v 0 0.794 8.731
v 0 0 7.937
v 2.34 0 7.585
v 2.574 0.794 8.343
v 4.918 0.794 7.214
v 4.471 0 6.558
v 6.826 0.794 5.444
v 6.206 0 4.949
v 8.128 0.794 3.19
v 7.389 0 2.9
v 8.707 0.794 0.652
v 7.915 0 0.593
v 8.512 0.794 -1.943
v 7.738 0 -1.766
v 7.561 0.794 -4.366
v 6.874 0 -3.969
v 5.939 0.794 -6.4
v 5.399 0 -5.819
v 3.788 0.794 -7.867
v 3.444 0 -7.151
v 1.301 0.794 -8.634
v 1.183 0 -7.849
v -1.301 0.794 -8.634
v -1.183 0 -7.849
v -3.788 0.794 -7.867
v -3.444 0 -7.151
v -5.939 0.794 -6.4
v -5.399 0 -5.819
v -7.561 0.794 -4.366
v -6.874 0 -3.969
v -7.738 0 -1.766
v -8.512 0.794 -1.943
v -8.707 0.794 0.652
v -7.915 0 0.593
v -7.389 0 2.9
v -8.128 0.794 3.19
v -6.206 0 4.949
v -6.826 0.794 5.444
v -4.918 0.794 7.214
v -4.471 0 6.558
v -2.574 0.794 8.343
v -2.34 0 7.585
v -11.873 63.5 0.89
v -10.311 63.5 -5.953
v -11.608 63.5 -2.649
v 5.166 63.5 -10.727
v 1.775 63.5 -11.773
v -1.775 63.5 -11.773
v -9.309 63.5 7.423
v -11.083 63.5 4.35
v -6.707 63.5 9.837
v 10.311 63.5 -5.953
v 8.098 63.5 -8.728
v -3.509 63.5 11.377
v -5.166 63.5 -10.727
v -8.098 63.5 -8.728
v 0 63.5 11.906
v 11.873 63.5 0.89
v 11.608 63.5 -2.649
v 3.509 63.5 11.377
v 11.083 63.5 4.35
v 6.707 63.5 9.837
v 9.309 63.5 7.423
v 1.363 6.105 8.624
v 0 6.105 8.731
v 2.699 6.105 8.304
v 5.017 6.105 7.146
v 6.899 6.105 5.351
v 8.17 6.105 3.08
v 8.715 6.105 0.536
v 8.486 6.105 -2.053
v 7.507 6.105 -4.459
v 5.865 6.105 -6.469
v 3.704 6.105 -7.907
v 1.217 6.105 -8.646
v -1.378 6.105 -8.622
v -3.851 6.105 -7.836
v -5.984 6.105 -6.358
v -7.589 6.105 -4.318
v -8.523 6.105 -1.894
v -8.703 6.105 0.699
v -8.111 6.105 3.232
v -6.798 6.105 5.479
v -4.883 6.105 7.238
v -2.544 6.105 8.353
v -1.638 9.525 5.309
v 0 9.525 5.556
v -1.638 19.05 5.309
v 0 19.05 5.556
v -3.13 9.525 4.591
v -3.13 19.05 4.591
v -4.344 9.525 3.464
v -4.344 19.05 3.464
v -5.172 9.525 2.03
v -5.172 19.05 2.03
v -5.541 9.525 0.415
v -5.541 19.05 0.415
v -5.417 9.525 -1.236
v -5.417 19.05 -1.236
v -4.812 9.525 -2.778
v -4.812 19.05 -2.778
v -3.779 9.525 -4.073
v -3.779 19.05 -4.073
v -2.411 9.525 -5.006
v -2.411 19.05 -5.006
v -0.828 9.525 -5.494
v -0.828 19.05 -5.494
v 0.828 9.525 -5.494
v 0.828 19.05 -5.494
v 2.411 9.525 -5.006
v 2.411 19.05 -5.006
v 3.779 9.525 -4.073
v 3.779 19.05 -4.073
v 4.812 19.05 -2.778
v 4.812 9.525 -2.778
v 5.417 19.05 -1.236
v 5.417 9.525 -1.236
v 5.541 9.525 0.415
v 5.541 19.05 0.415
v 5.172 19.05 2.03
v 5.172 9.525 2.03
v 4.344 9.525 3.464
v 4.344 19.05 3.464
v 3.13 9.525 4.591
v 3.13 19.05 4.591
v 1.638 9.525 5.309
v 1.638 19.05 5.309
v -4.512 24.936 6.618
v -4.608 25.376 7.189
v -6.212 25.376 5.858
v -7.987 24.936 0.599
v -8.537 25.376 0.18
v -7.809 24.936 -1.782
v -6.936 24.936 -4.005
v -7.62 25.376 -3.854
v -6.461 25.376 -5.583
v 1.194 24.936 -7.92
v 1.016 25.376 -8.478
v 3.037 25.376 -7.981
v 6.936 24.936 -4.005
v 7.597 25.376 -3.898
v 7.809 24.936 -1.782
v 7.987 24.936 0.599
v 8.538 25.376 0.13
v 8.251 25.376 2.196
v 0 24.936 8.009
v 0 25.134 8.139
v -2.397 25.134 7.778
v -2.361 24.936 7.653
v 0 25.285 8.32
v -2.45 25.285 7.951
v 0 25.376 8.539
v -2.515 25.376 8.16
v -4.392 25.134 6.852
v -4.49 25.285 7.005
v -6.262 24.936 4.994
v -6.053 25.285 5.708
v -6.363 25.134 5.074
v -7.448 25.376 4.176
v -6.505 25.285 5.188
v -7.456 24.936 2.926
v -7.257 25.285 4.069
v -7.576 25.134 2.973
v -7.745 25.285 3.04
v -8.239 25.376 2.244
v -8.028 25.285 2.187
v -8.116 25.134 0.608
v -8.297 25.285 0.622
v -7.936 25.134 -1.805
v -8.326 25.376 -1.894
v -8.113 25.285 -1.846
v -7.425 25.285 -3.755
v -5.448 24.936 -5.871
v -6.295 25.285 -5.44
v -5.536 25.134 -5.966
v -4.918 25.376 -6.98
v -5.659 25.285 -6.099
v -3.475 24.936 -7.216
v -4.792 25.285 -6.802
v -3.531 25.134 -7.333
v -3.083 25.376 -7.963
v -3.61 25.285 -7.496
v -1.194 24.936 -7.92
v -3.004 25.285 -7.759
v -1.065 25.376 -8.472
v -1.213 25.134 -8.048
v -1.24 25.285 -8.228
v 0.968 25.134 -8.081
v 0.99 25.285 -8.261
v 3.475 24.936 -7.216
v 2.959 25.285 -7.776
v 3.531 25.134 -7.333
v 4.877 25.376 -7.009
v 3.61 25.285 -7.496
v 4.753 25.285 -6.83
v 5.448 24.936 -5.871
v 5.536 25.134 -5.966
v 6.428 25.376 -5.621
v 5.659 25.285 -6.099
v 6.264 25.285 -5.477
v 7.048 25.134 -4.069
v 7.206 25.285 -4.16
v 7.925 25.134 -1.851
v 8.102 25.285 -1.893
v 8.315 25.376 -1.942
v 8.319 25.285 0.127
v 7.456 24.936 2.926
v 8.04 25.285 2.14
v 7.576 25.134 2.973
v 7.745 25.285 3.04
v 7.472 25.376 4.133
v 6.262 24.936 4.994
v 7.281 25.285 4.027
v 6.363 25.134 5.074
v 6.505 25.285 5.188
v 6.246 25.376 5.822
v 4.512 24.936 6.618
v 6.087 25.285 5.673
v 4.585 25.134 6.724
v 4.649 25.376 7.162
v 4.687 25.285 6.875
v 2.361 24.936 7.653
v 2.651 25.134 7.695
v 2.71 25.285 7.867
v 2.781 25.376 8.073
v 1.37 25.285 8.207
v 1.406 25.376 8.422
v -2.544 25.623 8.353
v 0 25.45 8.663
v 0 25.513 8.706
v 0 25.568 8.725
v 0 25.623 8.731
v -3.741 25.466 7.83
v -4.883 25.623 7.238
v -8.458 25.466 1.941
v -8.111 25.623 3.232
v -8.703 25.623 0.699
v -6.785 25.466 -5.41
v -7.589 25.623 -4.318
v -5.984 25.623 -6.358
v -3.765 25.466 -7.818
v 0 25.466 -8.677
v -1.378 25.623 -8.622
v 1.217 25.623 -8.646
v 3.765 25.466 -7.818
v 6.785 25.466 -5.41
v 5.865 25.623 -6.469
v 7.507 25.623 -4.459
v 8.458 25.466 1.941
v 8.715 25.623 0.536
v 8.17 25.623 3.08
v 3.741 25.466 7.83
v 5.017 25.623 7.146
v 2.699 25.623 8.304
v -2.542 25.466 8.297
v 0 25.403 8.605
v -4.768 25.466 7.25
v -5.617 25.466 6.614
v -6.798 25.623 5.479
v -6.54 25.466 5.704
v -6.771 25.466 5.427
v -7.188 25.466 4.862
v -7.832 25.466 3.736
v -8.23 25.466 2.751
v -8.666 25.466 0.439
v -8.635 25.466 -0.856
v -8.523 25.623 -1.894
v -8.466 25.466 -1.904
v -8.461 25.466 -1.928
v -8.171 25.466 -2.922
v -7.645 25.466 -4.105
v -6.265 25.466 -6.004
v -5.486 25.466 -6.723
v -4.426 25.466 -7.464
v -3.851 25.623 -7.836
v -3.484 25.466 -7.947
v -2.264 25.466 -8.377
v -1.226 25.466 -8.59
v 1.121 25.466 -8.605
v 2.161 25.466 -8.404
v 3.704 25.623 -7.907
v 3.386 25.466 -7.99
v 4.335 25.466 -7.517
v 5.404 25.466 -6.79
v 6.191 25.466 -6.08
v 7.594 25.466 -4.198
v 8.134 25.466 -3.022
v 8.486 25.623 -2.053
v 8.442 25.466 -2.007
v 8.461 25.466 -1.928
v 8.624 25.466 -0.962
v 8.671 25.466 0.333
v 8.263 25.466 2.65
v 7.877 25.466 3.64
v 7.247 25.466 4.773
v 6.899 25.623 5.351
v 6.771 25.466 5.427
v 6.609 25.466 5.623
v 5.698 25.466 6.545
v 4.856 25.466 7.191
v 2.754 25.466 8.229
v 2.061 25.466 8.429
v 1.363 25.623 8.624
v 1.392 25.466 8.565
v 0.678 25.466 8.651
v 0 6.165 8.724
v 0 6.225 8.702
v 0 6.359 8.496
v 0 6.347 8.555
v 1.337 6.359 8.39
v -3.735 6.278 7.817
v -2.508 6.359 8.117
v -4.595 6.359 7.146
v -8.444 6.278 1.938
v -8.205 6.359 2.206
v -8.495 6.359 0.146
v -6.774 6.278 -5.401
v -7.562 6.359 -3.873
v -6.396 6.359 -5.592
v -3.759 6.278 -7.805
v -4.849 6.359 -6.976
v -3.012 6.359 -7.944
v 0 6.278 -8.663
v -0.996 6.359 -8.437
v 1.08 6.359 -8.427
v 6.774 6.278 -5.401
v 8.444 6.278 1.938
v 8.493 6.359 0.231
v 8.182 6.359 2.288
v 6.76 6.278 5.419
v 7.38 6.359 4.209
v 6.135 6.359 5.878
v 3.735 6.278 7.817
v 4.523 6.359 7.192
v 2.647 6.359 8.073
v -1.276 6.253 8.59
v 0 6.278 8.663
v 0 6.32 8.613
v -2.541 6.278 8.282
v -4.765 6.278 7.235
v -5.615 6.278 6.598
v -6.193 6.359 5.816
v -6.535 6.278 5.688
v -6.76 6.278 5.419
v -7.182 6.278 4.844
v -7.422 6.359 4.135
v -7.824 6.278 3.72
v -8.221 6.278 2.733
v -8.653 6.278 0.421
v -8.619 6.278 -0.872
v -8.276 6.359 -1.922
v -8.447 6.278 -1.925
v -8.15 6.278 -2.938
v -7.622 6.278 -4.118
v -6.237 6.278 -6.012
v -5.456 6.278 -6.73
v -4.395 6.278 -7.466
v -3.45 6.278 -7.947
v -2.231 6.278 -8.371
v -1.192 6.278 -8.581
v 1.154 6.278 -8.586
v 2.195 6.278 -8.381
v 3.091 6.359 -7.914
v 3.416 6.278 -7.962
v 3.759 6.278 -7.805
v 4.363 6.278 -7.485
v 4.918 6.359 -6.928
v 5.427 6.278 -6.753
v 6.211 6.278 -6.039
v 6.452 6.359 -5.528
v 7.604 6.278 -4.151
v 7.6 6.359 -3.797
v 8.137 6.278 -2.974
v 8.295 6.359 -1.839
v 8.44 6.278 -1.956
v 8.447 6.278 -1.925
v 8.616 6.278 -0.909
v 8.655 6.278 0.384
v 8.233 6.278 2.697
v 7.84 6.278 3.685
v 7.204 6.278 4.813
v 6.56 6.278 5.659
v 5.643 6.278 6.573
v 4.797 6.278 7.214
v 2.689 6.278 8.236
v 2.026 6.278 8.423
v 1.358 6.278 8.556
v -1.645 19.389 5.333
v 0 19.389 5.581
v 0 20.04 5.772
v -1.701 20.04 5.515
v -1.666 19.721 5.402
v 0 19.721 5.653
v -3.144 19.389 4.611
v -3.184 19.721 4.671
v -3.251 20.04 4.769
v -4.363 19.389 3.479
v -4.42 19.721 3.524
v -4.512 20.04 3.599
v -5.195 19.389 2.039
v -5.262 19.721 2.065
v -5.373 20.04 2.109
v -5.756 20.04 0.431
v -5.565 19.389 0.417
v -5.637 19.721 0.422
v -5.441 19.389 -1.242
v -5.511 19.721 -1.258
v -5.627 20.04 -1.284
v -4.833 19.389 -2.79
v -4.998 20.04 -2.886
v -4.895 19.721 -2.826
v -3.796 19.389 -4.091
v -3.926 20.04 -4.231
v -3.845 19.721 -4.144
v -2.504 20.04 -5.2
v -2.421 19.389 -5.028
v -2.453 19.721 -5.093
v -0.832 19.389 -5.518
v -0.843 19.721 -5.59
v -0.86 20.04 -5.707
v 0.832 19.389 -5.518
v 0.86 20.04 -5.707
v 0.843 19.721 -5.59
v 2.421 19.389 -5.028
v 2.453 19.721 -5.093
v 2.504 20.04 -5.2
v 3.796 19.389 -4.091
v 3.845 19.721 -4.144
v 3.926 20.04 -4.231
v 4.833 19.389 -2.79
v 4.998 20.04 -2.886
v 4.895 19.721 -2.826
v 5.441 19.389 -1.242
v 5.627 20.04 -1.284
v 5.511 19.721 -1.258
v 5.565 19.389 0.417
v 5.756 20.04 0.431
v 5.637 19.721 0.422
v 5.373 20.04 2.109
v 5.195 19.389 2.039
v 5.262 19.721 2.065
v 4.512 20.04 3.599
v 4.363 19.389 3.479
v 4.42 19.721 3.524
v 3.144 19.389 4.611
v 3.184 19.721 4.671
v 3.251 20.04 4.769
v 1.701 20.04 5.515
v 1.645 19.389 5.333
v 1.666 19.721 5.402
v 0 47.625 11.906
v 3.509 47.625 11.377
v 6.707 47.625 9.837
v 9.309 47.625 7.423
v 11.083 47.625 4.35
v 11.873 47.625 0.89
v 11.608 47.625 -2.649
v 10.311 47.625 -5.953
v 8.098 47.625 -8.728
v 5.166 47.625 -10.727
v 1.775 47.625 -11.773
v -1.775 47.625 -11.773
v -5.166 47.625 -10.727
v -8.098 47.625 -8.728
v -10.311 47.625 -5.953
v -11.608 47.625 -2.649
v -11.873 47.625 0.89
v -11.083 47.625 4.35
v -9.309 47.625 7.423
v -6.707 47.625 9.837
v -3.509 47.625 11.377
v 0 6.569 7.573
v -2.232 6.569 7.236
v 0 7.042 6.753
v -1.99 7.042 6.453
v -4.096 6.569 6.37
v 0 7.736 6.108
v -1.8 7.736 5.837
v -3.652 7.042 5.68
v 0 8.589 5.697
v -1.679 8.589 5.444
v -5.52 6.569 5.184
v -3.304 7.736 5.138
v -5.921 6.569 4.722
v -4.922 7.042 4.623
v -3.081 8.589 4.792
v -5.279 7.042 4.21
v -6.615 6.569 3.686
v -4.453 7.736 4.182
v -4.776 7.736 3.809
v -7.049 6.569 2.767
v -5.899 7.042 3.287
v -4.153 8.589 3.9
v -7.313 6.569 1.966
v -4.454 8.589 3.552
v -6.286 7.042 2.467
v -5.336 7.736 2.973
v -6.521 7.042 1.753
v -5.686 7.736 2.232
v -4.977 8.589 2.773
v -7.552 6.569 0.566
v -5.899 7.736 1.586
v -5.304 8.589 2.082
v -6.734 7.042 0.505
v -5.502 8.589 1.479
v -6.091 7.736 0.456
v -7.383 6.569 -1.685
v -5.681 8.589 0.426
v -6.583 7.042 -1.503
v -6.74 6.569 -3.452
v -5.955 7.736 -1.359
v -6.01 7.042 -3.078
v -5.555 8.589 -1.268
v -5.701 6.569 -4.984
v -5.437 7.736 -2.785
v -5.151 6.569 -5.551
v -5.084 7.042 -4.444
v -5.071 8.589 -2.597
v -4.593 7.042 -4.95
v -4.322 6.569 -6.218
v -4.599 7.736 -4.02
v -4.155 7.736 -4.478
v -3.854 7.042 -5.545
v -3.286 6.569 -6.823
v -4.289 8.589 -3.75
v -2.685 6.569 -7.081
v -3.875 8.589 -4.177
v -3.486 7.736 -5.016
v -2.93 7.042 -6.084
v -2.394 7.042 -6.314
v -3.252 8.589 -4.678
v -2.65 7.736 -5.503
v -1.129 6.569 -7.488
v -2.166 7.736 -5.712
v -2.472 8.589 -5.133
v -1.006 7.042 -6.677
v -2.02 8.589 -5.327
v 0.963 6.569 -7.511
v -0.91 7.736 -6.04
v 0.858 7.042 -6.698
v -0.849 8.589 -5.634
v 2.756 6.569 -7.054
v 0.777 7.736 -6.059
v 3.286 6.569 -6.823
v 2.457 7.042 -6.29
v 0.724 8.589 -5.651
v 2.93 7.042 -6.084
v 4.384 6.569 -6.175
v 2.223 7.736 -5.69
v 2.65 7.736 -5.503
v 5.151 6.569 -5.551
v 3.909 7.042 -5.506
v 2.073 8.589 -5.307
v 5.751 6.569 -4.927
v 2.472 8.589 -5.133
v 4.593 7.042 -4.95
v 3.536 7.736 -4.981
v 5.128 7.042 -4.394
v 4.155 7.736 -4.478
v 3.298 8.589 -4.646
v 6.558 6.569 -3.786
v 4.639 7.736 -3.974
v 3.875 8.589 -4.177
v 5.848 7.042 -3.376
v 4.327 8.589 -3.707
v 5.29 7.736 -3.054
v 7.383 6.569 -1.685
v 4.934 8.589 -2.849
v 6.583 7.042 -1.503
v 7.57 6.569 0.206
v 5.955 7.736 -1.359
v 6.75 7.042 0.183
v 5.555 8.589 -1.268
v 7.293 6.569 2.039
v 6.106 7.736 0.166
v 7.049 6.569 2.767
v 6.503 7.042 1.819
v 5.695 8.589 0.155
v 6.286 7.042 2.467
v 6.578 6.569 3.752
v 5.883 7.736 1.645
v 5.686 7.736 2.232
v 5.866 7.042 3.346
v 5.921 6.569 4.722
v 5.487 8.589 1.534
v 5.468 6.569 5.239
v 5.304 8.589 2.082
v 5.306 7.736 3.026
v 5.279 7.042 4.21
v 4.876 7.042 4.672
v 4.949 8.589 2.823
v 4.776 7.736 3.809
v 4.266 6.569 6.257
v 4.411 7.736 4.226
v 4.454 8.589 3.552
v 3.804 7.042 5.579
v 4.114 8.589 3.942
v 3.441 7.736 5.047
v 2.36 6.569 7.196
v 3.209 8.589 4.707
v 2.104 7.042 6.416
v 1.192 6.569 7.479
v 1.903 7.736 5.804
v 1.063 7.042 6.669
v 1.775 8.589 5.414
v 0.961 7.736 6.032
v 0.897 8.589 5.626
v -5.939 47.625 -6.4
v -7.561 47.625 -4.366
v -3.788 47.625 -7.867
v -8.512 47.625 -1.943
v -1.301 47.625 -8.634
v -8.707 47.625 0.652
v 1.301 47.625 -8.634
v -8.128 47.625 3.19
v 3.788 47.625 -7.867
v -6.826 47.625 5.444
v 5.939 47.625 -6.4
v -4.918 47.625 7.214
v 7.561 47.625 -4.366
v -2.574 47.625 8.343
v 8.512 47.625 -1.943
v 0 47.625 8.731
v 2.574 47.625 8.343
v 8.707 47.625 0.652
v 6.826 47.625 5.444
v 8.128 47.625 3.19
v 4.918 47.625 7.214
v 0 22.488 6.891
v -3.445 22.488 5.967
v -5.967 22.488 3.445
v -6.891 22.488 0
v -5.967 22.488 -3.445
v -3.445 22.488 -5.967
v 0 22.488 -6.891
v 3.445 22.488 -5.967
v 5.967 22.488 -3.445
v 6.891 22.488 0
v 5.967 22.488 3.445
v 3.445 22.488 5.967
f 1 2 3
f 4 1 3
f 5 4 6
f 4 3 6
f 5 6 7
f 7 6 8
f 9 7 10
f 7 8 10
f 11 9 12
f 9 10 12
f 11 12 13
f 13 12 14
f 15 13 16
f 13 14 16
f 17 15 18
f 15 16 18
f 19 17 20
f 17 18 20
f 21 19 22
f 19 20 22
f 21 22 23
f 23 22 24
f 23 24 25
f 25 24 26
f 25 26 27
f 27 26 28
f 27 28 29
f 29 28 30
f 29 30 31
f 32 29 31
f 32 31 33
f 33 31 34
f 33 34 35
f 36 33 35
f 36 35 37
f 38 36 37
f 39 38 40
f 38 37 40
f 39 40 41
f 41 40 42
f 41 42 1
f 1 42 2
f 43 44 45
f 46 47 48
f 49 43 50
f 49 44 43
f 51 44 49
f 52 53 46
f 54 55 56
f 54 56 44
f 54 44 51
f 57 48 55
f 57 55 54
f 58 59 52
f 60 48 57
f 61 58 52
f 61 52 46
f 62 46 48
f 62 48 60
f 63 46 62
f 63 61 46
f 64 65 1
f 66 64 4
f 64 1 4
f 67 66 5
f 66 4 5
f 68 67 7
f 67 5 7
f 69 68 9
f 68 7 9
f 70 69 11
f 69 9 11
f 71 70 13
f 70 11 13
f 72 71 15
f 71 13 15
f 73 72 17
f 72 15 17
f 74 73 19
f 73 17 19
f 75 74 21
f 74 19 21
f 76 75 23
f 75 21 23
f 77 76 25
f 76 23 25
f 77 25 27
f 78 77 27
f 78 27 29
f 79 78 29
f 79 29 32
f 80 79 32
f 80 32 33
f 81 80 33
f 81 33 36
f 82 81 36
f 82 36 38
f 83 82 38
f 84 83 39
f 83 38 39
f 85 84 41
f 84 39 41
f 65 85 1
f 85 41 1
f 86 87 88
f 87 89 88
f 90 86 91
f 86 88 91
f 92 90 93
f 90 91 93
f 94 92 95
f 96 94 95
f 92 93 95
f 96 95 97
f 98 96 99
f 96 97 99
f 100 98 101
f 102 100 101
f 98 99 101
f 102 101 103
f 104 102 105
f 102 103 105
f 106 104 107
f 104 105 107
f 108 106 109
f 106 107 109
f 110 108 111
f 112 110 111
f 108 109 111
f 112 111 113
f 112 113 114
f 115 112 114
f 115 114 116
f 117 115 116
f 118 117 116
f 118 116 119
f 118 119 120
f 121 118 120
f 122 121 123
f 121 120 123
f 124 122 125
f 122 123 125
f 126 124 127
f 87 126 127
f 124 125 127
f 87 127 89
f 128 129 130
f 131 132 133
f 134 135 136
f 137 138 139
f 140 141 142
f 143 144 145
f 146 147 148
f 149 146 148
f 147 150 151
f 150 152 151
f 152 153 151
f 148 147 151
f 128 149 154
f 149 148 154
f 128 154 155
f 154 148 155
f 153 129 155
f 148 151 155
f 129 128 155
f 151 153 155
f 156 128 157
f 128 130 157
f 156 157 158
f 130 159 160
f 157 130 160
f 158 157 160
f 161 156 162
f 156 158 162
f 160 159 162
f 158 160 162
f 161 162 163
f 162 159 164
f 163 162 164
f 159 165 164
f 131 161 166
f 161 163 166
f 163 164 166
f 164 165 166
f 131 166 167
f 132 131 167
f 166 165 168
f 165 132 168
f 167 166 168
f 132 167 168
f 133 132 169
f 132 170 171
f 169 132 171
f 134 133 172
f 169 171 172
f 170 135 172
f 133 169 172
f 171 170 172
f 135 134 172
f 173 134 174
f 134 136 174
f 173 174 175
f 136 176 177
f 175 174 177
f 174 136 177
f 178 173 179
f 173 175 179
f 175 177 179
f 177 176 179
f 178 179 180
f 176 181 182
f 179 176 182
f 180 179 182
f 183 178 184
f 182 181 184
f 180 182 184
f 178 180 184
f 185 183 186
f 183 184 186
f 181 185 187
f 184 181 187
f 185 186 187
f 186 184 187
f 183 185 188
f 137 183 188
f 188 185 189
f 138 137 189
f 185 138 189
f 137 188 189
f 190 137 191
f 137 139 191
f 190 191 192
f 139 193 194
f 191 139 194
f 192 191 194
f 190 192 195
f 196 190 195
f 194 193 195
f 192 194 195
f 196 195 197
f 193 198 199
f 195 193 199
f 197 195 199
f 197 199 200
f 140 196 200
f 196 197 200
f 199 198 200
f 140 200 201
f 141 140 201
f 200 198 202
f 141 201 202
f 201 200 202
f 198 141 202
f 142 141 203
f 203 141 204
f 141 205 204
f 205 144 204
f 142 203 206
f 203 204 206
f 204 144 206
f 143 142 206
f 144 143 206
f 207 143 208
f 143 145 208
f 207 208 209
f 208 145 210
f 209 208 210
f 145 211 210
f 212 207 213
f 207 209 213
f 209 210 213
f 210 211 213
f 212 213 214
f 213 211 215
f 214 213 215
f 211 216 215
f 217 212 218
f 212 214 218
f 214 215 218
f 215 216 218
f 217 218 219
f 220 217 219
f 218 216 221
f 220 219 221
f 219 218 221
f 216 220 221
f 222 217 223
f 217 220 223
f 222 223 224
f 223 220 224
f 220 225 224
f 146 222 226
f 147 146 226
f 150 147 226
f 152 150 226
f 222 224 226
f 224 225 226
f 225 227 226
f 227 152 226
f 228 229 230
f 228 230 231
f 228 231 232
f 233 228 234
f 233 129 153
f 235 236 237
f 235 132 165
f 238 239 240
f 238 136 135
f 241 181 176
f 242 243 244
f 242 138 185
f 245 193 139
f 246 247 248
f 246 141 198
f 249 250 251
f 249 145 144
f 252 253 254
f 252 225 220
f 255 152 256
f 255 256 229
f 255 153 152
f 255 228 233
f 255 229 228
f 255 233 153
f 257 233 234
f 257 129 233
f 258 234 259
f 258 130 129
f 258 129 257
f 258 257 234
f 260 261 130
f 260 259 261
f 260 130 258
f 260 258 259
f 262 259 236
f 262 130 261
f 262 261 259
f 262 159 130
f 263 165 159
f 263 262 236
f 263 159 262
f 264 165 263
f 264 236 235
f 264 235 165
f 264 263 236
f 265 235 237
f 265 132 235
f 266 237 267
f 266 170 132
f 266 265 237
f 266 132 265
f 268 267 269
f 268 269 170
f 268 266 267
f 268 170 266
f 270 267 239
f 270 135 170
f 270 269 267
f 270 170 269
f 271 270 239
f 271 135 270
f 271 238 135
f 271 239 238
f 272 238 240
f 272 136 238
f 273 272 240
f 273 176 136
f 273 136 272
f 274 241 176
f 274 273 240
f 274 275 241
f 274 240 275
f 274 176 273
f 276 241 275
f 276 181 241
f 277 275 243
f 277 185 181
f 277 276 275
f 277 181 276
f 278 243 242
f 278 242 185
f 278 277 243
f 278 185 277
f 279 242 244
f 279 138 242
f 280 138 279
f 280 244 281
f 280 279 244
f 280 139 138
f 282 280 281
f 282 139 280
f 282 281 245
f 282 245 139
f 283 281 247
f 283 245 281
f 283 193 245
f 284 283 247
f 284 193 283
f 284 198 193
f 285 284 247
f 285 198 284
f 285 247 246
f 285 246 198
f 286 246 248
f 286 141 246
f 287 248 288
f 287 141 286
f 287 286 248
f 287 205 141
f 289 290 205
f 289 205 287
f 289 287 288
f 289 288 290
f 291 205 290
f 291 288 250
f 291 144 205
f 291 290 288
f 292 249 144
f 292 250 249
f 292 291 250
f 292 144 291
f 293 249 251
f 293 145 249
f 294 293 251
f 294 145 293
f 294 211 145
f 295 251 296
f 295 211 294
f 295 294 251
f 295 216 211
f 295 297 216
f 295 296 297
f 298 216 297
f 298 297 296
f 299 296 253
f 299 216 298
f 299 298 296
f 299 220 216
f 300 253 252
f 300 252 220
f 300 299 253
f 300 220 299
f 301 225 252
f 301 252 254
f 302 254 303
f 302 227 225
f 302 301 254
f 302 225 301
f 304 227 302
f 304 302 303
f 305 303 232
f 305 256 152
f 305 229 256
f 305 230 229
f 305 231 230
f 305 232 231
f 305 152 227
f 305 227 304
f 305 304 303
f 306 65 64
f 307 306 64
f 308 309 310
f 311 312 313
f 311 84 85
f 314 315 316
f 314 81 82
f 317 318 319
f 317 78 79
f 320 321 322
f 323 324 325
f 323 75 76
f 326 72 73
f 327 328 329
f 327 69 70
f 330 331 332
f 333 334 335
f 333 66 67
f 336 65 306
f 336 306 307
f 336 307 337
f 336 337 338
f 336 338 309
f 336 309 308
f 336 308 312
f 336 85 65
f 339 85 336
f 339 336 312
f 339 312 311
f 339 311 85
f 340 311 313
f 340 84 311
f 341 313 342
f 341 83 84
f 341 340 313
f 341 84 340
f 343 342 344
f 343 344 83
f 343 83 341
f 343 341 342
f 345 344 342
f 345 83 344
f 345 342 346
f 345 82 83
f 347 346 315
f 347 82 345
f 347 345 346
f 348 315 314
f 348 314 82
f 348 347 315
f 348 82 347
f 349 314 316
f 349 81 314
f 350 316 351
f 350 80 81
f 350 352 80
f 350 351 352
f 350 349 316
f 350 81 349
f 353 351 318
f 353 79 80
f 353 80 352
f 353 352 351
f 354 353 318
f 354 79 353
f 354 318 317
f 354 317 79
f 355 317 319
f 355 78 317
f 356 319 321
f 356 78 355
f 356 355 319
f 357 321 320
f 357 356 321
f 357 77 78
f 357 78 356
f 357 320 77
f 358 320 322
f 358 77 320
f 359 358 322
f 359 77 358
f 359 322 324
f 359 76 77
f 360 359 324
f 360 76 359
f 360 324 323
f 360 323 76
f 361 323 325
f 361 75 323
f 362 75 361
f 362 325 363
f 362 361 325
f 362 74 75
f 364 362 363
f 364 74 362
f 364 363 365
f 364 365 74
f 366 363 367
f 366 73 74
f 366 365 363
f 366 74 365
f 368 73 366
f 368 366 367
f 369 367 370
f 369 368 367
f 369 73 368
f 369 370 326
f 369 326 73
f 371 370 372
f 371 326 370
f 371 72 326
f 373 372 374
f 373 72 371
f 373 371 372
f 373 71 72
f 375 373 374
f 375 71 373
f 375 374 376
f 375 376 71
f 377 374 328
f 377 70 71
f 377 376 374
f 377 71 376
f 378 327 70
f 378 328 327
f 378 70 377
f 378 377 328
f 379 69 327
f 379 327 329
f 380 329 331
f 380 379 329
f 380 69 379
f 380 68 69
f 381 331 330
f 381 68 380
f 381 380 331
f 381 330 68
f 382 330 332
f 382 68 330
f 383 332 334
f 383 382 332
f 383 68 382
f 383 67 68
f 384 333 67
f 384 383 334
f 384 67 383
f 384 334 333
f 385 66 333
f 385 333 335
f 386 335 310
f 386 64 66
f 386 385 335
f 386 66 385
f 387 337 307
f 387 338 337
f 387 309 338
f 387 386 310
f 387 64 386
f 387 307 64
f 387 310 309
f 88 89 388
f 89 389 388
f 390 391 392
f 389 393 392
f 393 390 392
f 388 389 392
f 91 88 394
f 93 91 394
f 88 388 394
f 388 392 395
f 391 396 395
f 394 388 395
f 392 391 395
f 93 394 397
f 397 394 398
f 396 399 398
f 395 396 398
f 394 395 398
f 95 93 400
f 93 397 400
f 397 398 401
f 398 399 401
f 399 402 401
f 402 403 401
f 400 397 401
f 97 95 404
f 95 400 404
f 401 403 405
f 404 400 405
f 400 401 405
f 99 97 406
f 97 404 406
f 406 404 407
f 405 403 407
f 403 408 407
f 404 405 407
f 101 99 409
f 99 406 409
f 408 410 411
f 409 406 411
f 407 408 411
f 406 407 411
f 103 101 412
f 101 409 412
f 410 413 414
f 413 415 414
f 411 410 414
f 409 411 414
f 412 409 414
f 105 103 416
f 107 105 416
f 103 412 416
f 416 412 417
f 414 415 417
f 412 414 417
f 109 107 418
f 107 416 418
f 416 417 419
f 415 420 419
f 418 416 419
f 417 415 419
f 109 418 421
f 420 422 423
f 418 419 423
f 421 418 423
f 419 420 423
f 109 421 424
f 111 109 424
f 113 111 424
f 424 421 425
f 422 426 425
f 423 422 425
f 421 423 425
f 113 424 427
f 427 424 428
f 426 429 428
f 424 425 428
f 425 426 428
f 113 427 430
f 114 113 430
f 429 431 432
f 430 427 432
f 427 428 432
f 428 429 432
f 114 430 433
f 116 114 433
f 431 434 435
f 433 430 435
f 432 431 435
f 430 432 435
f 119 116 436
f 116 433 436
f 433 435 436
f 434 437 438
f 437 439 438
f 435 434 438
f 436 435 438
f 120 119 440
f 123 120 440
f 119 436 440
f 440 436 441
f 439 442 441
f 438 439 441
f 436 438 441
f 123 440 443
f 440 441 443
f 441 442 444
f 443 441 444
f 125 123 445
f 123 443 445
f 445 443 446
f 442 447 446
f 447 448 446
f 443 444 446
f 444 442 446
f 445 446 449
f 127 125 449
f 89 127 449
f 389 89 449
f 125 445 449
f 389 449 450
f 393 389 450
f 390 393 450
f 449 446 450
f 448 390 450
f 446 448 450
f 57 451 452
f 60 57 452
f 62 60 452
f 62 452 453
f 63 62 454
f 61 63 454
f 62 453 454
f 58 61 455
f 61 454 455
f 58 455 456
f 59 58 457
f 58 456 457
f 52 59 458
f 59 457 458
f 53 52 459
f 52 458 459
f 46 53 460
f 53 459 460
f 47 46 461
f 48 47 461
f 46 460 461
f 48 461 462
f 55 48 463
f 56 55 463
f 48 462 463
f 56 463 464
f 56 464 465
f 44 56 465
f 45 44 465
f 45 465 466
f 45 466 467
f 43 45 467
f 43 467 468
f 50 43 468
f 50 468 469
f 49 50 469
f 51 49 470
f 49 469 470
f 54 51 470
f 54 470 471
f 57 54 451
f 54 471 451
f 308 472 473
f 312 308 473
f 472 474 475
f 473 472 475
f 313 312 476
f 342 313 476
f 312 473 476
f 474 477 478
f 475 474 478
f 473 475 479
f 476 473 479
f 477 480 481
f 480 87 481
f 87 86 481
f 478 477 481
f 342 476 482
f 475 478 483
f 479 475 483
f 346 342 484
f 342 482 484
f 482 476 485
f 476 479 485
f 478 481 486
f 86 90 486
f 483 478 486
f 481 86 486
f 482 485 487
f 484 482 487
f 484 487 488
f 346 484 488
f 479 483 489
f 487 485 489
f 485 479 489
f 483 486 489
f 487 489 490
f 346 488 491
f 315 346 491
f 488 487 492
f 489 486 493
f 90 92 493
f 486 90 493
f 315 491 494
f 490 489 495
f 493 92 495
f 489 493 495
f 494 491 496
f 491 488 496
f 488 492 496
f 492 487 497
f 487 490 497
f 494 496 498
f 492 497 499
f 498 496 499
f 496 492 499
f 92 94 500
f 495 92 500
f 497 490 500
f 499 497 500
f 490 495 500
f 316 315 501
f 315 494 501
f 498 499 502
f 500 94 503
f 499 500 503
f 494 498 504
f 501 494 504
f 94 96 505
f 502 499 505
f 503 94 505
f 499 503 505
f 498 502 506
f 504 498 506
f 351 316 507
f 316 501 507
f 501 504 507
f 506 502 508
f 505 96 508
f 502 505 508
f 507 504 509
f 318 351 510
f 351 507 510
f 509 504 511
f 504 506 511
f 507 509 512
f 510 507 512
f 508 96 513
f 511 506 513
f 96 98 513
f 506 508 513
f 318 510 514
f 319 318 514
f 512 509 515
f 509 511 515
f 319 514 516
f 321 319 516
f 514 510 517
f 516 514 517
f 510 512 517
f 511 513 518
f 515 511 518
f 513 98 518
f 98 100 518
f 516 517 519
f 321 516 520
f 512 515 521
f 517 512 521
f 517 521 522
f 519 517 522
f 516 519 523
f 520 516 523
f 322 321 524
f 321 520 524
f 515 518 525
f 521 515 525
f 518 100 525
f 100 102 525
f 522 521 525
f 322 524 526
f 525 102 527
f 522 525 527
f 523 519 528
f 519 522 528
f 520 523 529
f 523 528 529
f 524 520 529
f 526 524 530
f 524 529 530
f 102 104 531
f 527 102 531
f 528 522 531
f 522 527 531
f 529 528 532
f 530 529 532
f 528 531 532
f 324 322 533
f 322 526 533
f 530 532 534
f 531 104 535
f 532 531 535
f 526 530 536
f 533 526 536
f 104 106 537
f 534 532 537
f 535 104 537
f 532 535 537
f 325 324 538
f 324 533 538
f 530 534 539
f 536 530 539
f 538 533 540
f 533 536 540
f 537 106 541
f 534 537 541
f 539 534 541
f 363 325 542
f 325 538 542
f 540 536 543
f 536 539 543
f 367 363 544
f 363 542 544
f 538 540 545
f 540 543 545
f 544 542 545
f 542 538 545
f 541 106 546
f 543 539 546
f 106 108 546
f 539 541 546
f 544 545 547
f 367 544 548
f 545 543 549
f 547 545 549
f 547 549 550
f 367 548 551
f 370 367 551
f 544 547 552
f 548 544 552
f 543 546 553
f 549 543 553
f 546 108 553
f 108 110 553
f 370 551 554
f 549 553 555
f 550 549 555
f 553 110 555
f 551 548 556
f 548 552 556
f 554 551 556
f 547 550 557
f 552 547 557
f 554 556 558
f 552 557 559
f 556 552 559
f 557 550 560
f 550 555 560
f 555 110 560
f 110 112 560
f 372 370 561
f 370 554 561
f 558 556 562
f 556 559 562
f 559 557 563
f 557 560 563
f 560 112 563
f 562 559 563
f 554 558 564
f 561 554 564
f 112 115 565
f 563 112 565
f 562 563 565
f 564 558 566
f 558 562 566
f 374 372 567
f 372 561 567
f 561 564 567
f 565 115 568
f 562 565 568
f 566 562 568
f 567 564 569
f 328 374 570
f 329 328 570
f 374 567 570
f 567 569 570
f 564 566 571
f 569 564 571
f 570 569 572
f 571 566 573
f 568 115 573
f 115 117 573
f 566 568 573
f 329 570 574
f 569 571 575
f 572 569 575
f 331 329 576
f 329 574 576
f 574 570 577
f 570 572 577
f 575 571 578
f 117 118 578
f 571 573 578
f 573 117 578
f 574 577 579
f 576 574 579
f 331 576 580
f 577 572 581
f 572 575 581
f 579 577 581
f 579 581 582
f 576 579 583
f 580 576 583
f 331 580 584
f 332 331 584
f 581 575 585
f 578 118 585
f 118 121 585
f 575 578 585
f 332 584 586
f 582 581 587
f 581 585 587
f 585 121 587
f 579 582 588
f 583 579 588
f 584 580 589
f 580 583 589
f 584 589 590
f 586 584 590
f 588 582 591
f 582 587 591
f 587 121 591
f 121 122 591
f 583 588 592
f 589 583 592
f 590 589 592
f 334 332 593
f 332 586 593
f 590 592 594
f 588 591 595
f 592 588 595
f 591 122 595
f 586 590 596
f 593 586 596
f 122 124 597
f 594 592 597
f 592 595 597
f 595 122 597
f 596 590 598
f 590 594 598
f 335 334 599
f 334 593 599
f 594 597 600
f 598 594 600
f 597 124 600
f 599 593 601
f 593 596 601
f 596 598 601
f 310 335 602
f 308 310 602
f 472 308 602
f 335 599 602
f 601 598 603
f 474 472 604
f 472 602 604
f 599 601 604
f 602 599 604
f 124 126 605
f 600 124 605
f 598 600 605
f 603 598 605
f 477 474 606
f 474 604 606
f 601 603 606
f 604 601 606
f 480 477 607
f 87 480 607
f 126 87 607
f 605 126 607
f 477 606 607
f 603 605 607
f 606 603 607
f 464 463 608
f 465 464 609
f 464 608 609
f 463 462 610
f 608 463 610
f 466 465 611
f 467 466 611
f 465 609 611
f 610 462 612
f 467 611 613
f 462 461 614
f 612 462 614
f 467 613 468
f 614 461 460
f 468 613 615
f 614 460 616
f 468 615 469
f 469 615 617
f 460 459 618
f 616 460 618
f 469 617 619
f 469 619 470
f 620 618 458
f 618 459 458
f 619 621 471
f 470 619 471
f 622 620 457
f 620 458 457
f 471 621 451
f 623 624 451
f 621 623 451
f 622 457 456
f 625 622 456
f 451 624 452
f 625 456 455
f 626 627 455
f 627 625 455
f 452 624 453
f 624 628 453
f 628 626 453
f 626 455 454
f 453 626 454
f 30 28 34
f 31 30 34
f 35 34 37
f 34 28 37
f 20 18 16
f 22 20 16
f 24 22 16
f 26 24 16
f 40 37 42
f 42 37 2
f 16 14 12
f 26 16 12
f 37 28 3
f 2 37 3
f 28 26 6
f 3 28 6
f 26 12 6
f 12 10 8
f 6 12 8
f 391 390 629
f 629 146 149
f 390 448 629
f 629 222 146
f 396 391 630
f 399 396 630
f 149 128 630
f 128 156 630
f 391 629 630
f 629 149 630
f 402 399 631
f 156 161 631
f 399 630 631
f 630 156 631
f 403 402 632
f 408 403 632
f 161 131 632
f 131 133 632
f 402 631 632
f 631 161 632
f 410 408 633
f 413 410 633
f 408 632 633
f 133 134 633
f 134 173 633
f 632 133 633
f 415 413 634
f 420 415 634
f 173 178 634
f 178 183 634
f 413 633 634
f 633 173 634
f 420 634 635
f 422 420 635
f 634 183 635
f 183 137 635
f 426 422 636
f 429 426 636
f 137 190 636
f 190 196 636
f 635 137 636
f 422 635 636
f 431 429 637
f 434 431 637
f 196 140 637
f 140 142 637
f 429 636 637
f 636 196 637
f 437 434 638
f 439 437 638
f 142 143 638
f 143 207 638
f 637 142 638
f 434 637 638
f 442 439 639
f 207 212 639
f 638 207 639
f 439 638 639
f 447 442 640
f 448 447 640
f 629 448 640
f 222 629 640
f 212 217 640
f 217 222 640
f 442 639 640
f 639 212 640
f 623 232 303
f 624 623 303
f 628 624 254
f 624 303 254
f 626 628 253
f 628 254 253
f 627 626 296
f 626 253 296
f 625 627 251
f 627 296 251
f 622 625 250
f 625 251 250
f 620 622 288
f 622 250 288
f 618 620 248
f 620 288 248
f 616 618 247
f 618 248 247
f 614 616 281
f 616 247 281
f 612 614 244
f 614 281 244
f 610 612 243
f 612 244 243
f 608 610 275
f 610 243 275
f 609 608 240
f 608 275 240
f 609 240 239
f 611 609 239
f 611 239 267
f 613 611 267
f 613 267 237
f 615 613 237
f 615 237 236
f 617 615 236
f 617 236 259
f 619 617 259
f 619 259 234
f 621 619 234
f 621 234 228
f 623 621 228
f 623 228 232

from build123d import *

# Parameters (mm, degrees)
SKETCH1_R               = 8.73125
MAIN_DEPTH              = 47.625
CHAMFER1_SIZE           = 0.79375
FILLET1_R               = 0.254
SKETCH6_R               = 11.90625
SPRING_STABILIZER_DEPTH = 15.875


with BuildPart() as part:
    # Sketch1 → main (new body)
    with BuildSketch(Plane(origin=(0, 0, 0), x_dir=(1, 0, 0), z_dir=(0, 1, 0))):
        Circle(SKETCH1_R)
    extrude(amount=MAIN_DEPTH)

    # Chamfer1
    chamfer1_edges = [part.edges().sort_by_distance(p)[0] for p in [
        (-8.73125, 0, 0),
    ]]
    chamfer(chamfer1_edges, length=CHAMFER1_SIZE)

    # Sketch2 → ball_channel (revolve, cut)
    with BuildSketch(Plane(origin=(0, 0, 0), x_dir=(0, 0, -1), z_dir=(1, 0, 0))):
        with BuildLine():
            ThreePointArc((-8.009313581, 24.93617028), (-8.302201361, 25.274050408), (-8.73125, 25.400000791))
            Line((-8.73125, 25.400000791), (-8.73125, 6.350000791))
            ThreePointArc((-8.73125, 6.350000791), (-6.48618597, 7.279936761), (-5.55625, 9.525000791))
            Line((-5.55625, 9.525000791), (-5.55625, 19.050000791))
            ThreePointArc((-5.55625, 19.050000791), (-5.610733482, 19.556468098), (-5.771690742, 20.039759257))
            Line((-5.771690742, 20.039759257), (-8.009313581, 24.93617028))
        make_face()
    revolve(axis=Axis((0, 47.625, 0), (0, -1, 0)), mode=Mode.SUBTRACT)

    # Fillet1
    fillet1_edges = [part.edges().sort_by_distance(p)[0] for p in [
        (-6.173926083, 25.400000791, -6.173926083),
        (6.173926083, 6.350000791, 6.173926083),
    ]]
    fillet(fillet1_edges, radius=FILLET1_R)

    # Sketch6 → spring_stabilizer (add)
    with BuildSketch(Plane(origin=(0, 47.625, 0), x_dir=(1, 0, 0), z_dir=(0, 1, 0))):
        Circle(SKETCH6_R)
    extrude(amount=SPRING_STABILIZER_DEPTH)


solid = part.part
